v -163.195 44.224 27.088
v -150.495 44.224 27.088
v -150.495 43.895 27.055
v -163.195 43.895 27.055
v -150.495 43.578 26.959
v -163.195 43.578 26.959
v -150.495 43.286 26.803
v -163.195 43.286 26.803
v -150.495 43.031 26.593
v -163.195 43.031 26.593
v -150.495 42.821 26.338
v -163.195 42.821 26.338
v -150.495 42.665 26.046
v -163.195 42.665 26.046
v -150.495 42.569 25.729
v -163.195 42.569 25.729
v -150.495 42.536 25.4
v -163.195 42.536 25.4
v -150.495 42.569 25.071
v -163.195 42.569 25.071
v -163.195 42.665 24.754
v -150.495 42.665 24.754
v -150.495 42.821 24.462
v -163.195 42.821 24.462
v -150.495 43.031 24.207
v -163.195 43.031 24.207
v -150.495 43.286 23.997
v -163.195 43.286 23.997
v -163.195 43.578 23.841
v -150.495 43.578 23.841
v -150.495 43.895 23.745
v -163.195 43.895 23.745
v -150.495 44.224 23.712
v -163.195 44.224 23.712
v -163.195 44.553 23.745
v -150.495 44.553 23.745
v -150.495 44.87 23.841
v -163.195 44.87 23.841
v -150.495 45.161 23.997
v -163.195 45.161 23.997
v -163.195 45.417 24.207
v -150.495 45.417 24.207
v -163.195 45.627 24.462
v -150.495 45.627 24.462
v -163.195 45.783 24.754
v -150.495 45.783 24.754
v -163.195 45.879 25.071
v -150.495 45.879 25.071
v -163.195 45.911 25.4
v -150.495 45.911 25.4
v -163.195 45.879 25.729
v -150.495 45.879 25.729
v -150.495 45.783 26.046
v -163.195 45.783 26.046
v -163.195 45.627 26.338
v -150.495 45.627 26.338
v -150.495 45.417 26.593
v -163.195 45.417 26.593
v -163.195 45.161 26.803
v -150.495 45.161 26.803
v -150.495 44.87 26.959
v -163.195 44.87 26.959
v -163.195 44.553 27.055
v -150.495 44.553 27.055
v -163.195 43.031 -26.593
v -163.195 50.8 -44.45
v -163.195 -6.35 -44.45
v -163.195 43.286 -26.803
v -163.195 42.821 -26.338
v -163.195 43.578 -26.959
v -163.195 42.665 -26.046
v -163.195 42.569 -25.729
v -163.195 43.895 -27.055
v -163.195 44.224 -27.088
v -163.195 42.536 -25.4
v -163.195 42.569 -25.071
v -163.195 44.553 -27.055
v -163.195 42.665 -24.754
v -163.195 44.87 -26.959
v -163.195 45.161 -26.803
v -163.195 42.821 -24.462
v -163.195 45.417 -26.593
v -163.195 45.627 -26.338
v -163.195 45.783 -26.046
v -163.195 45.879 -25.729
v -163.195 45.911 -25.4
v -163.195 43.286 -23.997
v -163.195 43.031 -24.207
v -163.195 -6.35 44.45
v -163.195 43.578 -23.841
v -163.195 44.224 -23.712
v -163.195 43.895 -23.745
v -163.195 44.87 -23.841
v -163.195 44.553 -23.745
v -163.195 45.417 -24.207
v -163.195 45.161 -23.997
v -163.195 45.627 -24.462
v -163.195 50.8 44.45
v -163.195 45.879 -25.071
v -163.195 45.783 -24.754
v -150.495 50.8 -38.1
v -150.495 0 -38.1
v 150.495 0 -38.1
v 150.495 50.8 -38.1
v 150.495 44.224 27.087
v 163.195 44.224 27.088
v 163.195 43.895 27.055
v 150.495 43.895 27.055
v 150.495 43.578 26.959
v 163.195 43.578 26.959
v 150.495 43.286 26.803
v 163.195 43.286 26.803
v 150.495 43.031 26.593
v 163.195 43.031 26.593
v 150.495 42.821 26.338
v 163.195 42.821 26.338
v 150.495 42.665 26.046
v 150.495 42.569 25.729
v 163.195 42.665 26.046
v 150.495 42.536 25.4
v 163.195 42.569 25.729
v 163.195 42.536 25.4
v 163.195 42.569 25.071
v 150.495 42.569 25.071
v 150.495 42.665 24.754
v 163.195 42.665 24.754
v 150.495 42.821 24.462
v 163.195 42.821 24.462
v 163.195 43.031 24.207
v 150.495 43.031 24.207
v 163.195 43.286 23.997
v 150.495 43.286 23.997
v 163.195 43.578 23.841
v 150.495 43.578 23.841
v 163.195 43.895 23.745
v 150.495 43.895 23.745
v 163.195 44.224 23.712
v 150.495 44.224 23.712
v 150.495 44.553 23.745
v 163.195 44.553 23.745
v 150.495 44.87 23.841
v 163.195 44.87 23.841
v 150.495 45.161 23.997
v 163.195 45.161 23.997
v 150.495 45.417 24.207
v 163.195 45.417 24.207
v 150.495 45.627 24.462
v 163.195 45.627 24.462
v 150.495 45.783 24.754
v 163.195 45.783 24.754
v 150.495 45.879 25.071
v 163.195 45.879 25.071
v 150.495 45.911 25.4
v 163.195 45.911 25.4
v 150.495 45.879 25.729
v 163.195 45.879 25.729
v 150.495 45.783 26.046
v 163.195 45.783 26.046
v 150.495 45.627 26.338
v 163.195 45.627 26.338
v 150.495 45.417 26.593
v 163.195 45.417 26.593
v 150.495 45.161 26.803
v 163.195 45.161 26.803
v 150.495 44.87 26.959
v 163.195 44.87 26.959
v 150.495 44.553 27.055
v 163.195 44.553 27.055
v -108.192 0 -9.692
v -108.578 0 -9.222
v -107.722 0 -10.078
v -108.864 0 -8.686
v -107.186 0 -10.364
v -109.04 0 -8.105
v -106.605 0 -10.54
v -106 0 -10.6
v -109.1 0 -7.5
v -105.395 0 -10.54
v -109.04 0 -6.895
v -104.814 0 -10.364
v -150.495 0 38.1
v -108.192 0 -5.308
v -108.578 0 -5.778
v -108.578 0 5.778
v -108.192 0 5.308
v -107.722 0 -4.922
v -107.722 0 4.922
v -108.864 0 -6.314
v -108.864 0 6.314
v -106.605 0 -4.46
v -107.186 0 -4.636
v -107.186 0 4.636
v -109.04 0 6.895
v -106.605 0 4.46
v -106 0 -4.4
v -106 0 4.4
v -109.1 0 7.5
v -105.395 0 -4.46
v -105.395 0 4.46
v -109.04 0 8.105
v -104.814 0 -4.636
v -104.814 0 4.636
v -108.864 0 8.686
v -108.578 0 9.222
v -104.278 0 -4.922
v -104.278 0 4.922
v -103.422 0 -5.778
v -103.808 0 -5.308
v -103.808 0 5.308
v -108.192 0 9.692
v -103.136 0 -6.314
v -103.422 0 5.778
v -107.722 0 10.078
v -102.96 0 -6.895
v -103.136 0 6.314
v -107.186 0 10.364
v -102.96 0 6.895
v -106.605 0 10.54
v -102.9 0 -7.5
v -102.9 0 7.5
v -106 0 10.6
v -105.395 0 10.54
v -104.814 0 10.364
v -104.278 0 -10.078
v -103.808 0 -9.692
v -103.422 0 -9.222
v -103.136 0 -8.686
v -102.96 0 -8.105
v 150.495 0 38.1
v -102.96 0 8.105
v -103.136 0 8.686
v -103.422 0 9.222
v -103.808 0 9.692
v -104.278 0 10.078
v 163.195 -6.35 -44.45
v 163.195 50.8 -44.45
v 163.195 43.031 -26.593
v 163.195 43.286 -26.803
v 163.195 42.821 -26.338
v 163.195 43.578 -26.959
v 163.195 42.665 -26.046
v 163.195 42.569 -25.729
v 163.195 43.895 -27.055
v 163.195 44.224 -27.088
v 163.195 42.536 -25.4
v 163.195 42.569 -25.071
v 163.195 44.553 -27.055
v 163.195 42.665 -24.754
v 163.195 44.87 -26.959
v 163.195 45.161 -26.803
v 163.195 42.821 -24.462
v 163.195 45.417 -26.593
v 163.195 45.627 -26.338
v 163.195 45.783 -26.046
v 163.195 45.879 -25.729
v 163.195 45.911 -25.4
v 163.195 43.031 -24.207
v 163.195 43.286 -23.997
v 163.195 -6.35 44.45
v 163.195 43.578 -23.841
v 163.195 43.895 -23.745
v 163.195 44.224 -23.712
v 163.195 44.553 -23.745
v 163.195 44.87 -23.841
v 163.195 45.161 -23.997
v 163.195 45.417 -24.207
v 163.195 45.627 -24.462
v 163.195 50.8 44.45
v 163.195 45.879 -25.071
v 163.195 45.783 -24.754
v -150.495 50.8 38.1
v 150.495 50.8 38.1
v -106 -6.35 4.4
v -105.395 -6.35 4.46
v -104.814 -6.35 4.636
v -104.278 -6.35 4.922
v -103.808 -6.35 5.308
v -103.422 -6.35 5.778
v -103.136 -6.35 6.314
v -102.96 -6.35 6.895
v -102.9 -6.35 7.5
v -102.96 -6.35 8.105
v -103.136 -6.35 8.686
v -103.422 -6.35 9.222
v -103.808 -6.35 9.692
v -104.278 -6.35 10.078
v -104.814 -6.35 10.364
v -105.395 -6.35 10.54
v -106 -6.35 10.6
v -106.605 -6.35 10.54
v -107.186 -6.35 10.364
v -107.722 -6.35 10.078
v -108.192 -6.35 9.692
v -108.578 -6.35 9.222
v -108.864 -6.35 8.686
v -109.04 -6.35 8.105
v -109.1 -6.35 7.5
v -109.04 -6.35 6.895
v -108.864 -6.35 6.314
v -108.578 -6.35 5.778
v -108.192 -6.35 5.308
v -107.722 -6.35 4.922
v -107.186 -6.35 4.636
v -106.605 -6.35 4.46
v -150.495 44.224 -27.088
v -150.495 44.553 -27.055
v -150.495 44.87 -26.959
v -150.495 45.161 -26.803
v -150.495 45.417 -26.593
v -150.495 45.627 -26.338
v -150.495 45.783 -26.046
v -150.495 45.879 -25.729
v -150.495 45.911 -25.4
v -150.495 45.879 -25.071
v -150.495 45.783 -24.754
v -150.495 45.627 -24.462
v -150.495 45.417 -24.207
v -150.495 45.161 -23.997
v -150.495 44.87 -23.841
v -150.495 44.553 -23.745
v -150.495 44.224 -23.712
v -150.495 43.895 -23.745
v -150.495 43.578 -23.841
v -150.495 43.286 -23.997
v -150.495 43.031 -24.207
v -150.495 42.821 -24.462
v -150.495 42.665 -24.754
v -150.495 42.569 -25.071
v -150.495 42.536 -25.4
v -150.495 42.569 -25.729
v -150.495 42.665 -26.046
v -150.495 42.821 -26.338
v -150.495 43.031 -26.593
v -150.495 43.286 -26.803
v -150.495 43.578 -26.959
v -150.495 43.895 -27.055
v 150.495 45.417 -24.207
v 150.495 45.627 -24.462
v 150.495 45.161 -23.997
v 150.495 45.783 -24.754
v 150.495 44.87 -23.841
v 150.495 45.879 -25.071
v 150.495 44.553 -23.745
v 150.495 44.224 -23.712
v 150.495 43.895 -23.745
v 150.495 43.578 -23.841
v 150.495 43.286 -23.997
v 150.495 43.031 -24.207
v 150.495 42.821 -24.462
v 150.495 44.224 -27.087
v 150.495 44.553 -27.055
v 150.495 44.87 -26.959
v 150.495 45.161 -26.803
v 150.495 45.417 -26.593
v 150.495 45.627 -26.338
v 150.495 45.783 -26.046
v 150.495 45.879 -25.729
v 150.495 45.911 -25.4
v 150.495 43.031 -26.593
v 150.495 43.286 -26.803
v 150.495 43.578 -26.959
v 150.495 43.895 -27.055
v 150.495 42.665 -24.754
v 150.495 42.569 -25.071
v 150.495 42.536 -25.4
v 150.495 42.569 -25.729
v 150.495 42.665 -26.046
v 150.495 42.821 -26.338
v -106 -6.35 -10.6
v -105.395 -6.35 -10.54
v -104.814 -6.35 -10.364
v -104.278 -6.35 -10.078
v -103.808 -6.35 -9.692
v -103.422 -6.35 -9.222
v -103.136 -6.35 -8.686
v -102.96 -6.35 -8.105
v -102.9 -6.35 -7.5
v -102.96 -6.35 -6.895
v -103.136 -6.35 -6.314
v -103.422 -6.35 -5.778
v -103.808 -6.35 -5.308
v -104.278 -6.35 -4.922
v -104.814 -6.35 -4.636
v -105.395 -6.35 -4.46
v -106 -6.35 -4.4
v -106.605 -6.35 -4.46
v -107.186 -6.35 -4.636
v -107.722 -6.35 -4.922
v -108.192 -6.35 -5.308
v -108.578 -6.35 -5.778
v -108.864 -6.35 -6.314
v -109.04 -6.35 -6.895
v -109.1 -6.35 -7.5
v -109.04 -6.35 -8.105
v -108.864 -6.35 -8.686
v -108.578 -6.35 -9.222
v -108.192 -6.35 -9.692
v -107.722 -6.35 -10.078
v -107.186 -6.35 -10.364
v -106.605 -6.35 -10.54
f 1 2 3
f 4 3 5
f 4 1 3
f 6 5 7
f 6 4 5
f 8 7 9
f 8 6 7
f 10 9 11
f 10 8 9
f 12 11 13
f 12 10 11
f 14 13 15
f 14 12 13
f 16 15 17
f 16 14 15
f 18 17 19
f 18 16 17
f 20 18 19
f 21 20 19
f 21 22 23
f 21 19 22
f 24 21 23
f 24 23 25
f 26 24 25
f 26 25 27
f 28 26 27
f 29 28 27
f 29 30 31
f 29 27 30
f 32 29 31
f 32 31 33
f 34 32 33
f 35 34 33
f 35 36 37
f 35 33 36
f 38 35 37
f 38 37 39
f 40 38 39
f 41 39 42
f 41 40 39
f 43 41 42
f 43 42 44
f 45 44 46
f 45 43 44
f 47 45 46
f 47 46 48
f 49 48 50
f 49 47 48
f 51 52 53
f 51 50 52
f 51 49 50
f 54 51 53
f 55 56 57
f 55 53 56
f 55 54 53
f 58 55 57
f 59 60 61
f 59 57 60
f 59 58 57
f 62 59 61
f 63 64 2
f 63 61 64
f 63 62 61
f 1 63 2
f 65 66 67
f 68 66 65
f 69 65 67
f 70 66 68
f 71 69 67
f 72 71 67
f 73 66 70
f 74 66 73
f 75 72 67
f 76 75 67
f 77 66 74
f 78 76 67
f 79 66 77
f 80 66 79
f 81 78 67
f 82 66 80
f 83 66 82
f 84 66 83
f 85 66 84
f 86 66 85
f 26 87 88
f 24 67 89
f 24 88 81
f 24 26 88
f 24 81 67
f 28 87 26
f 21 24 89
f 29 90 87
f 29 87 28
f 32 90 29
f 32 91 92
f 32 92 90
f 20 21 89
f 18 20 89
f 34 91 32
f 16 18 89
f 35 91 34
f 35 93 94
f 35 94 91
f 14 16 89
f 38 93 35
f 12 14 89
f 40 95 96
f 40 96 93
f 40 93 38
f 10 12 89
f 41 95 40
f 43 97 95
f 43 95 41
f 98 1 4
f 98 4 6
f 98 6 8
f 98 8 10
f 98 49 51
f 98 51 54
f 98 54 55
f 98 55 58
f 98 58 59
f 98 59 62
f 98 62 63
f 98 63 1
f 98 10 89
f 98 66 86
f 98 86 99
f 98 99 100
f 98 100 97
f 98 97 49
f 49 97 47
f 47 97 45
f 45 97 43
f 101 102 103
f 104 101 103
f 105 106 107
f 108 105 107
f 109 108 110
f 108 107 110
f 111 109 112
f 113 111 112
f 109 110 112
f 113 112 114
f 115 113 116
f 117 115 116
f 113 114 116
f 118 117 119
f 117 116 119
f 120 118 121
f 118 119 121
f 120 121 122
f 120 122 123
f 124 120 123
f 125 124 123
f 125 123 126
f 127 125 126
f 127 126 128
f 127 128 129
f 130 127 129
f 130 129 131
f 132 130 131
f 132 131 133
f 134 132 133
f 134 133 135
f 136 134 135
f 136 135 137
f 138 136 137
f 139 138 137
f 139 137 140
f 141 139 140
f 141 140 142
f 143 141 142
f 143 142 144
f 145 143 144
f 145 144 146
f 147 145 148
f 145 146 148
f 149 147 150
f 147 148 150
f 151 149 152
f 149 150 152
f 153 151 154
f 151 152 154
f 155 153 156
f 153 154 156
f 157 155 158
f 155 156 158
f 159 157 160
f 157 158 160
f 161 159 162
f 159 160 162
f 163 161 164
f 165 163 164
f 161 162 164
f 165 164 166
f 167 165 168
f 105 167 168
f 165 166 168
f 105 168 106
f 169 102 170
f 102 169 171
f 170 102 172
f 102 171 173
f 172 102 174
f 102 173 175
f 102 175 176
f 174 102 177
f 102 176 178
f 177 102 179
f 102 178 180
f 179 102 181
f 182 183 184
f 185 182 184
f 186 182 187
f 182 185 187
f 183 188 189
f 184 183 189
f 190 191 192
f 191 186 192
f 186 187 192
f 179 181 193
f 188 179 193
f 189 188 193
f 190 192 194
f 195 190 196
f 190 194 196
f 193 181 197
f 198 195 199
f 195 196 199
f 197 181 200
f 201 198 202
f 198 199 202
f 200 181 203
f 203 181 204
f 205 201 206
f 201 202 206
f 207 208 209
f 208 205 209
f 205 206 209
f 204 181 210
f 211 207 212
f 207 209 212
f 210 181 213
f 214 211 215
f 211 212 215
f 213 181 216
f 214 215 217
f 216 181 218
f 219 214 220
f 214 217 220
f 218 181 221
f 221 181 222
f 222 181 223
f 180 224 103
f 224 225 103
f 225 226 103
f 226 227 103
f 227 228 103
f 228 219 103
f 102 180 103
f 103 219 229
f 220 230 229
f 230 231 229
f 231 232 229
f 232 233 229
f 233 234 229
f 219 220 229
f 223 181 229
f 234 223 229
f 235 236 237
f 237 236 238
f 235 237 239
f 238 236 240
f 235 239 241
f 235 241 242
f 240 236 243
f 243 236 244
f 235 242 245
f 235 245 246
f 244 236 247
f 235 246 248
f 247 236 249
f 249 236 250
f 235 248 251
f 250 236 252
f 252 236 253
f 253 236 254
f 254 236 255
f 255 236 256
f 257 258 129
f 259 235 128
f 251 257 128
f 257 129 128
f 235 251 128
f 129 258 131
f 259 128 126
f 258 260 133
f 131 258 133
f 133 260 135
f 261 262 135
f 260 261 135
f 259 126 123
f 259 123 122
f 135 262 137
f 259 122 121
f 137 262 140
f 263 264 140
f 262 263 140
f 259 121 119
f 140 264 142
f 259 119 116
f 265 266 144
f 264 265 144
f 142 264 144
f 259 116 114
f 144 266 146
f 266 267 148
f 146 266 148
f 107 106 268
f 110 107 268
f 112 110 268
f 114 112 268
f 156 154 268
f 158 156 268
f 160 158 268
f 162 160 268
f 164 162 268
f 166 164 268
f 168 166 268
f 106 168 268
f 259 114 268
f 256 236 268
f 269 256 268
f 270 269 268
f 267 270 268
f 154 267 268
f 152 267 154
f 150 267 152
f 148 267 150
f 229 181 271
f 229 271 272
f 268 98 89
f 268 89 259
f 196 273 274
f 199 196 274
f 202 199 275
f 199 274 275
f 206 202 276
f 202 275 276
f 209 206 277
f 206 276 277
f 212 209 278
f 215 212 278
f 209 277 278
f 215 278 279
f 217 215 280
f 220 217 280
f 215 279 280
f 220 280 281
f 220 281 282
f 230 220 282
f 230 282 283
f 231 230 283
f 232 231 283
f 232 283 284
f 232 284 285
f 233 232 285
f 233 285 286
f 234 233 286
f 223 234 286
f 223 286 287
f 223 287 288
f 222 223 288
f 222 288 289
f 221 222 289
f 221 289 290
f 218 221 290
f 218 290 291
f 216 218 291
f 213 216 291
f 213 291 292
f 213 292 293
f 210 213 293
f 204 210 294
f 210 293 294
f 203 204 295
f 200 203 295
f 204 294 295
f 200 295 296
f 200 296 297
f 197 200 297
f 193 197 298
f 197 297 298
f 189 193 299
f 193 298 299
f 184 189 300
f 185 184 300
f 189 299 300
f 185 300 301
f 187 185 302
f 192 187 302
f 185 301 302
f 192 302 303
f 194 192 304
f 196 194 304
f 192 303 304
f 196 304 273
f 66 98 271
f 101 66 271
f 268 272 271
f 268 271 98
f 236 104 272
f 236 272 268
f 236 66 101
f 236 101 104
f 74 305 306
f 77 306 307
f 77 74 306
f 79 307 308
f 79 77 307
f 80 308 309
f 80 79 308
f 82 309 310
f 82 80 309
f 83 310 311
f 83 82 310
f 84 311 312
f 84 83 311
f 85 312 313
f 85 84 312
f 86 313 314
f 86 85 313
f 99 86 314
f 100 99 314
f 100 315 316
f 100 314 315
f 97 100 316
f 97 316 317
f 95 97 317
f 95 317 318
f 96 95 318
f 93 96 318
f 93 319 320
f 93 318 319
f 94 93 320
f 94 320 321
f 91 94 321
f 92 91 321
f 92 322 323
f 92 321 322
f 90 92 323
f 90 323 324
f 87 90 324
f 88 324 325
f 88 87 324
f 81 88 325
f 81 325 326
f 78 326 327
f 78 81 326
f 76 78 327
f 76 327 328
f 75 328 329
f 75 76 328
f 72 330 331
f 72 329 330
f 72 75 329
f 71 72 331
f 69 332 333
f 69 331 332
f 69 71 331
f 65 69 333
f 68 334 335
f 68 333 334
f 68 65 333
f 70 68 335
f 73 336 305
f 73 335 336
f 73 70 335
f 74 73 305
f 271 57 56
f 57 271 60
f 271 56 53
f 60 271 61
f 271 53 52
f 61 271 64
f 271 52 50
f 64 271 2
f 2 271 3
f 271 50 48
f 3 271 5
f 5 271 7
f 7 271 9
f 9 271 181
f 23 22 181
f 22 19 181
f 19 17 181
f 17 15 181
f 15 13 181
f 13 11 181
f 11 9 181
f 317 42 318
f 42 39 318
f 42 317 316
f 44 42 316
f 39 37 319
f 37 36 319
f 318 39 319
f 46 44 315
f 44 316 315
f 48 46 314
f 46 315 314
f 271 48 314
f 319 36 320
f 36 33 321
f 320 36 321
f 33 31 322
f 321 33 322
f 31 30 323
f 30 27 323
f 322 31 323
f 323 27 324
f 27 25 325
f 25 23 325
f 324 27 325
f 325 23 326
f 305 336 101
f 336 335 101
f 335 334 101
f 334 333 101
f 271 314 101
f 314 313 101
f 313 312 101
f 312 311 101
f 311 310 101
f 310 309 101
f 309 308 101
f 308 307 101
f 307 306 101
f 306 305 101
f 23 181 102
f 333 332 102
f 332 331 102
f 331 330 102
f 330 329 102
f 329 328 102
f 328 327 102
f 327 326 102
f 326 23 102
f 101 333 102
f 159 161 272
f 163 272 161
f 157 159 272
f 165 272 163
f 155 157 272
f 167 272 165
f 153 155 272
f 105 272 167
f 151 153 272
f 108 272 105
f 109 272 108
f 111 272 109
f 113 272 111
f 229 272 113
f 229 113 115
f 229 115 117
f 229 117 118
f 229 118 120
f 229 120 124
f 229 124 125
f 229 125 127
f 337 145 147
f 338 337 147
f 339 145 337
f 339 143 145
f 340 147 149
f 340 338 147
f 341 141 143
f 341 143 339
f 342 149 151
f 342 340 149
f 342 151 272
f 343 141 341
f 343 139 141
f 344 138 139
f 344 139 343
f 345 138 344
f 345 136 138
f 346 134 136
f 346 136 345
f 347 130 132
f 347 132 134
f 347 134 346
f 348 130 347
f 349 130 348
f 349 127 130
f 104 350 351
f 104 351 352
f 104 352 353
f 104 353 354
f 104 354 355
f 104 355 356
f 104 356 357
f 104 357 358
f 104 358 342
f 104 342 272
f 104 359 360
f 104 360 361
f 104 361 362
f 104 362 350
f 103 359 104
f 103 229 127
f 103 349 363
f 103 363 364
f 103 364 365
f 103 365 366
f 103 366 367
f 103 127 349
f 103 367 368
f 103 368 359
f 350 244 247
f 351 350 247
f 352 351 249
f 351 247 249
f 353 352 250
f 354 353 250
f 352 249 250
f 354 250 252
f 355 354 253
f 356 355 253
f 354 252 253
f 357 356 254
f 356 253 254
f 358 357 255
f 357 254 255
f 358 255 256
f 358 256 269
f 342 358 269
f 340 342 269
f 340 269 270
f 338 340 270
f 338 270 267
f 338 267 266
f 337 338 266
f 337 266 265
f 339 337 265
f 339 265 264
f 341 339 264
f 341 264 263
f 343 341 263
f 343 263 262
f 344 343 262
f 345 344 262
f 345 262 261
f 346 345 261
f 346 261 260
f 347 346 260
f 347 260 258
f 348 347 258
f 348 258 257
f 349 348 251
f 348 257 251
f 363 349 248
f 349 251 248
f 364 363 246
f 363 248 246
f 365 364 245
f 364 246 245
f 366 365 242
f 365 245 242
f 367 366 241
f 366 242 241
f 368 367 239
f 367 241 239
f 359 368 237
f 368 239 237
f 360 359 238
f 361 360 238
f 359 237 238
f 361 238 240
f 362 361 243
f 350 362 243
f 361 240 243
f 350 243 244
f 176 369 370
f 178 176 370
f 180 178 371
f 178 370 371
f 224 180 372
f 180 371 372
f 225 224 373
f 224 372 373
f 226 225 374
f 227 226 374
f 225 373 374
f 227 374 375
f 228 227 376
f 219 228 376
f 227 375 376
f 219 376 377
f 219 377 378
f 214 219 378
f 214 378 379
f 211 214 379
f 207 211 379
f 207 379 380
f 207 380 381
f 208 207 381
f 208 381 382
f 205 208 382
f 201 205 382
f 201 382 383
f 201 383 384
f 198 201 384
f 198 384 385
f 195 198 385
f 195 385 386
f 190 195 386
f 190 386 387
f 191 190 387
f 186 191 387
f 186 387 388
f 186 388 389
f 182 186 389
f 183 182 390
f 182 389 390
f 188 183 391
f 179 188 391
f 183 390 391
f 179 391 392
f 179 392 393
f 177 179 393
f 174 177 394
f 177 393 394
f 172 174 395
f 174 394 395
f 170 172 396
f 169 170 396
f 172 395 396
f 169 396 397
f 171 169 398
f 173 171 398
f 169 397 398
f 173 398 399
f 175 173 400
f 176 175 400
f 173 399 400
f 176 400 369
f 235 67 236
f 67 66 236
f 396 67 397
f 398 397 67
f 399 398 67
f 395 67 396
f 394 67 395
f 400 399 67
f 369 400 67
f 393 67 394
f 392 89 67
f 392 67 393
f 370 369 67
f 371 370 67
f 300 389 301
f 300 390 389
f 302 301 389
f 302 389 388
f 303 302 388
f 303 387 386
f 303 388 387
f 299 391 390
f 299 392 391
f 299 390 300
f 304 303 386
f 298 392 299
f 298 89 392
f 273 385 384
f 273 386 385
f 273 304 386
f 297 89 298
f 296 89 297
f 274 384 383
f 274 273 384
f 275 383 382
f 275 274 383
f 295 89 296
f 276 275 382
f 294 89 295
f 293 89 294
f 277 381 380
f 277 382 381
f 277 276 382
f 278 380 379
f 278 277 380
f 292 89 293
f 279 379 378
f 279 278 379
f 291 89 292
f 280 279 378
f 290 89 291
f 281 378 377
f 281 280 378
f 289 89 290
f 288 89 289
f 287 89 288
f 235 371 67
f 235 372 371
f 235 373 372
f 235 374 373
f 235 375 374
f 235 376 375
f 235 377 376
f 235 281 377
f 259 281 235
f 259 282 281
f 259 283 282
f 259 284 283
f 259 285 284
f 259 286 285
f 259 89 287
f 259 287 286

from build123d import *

# Parameters (mm, degrees)
SKETCH1_W           = 326.39
SKETCH1_H           = 88.9
SKETCH1_W_2         = 300.99
SKETCH1_H_2         = 76.2
BOSS_EXTRUDE1_DEPTH = 50.8
SKETCH2_W           = 326.39
SKETCH2_H           = 88.9
BOSS_EXTRUDE2_DEPTH = 6.35
SKETCH3_R           = 3.1
CUT_EXTRUDE1_DEPTH  = 179.534402917
SKETCH4_R           = 1.6875
CUT_EXTRUDE3_DEPTH  = 313.69


with BuildPart() as part:
    # Sketch1 → Boss-Extrude1 (new body)
    with BuildSketch(Plane(origin=(0, 0, 0), x_dir=(1, 0, 0), z_dir=(0, 1, 0))):
        Rectangle(SKETCH1_W, SKETCH1_H)
        Rectangle(SKETCH1_W_2, SKETCH1_H_2, mode=Mode.SUBTRACT)
    extrude(amount=BOSS_EXTRUDE1_DEPTH)

    # Sketch2 → Boss-Extrude2 (add)
    with BuildSketch(Plane.XZ):
        Rectangle(SKETCH2_W, SKETCH2_H)
    extrude(amount=BOSS_EXTRUDE2_DEPTH)

    # Sketch3 → Cut-Extrude1 (cut, through all)
    with BuildSketch(Plane.XZ.offset(6.35)):
        with Locations(Location((-106, 7.5, 0), (0, 0, 270))):
            Circle(SKETCH3_R)
        with Locations(Location((-106, -7.5, 0), (0, 0, 270))):
            Circle(SKETCH3_R)
    extrude(amount=-CUT_EXTRUDE1_DEPTH, mode=Mode.SUBTRACT)

    # Sketch4 → Cut-Extrude3 (cut)
    with BuildSketch(Plane(origin=(163.195, 0, 0), x_dir=(0, 0, -1), z_dir=(1, 0, 0))):
        with Locations((25.4, 44.22394)):
            Circle(SKETCH4_R)
        with Locations(Location((-25.4, 44.22394, 0), (0, 0, 180))):
            Circle(SKETCH4_R)
    cut_extrude3 = extrude(amount=-CUT_EXTRUDE3_DEPTH, mode=Mode.SUBTRACT)

    # Mirror2: Cut-Extrude3 across plane
    add(cut_extrude3.mirror(Plane(origin=(0, 0, 0), x_dir=(0, 0, 1), z_dir=(1, 0, 0))), mode=Mode.SUBTRACT)


solid = part.part
